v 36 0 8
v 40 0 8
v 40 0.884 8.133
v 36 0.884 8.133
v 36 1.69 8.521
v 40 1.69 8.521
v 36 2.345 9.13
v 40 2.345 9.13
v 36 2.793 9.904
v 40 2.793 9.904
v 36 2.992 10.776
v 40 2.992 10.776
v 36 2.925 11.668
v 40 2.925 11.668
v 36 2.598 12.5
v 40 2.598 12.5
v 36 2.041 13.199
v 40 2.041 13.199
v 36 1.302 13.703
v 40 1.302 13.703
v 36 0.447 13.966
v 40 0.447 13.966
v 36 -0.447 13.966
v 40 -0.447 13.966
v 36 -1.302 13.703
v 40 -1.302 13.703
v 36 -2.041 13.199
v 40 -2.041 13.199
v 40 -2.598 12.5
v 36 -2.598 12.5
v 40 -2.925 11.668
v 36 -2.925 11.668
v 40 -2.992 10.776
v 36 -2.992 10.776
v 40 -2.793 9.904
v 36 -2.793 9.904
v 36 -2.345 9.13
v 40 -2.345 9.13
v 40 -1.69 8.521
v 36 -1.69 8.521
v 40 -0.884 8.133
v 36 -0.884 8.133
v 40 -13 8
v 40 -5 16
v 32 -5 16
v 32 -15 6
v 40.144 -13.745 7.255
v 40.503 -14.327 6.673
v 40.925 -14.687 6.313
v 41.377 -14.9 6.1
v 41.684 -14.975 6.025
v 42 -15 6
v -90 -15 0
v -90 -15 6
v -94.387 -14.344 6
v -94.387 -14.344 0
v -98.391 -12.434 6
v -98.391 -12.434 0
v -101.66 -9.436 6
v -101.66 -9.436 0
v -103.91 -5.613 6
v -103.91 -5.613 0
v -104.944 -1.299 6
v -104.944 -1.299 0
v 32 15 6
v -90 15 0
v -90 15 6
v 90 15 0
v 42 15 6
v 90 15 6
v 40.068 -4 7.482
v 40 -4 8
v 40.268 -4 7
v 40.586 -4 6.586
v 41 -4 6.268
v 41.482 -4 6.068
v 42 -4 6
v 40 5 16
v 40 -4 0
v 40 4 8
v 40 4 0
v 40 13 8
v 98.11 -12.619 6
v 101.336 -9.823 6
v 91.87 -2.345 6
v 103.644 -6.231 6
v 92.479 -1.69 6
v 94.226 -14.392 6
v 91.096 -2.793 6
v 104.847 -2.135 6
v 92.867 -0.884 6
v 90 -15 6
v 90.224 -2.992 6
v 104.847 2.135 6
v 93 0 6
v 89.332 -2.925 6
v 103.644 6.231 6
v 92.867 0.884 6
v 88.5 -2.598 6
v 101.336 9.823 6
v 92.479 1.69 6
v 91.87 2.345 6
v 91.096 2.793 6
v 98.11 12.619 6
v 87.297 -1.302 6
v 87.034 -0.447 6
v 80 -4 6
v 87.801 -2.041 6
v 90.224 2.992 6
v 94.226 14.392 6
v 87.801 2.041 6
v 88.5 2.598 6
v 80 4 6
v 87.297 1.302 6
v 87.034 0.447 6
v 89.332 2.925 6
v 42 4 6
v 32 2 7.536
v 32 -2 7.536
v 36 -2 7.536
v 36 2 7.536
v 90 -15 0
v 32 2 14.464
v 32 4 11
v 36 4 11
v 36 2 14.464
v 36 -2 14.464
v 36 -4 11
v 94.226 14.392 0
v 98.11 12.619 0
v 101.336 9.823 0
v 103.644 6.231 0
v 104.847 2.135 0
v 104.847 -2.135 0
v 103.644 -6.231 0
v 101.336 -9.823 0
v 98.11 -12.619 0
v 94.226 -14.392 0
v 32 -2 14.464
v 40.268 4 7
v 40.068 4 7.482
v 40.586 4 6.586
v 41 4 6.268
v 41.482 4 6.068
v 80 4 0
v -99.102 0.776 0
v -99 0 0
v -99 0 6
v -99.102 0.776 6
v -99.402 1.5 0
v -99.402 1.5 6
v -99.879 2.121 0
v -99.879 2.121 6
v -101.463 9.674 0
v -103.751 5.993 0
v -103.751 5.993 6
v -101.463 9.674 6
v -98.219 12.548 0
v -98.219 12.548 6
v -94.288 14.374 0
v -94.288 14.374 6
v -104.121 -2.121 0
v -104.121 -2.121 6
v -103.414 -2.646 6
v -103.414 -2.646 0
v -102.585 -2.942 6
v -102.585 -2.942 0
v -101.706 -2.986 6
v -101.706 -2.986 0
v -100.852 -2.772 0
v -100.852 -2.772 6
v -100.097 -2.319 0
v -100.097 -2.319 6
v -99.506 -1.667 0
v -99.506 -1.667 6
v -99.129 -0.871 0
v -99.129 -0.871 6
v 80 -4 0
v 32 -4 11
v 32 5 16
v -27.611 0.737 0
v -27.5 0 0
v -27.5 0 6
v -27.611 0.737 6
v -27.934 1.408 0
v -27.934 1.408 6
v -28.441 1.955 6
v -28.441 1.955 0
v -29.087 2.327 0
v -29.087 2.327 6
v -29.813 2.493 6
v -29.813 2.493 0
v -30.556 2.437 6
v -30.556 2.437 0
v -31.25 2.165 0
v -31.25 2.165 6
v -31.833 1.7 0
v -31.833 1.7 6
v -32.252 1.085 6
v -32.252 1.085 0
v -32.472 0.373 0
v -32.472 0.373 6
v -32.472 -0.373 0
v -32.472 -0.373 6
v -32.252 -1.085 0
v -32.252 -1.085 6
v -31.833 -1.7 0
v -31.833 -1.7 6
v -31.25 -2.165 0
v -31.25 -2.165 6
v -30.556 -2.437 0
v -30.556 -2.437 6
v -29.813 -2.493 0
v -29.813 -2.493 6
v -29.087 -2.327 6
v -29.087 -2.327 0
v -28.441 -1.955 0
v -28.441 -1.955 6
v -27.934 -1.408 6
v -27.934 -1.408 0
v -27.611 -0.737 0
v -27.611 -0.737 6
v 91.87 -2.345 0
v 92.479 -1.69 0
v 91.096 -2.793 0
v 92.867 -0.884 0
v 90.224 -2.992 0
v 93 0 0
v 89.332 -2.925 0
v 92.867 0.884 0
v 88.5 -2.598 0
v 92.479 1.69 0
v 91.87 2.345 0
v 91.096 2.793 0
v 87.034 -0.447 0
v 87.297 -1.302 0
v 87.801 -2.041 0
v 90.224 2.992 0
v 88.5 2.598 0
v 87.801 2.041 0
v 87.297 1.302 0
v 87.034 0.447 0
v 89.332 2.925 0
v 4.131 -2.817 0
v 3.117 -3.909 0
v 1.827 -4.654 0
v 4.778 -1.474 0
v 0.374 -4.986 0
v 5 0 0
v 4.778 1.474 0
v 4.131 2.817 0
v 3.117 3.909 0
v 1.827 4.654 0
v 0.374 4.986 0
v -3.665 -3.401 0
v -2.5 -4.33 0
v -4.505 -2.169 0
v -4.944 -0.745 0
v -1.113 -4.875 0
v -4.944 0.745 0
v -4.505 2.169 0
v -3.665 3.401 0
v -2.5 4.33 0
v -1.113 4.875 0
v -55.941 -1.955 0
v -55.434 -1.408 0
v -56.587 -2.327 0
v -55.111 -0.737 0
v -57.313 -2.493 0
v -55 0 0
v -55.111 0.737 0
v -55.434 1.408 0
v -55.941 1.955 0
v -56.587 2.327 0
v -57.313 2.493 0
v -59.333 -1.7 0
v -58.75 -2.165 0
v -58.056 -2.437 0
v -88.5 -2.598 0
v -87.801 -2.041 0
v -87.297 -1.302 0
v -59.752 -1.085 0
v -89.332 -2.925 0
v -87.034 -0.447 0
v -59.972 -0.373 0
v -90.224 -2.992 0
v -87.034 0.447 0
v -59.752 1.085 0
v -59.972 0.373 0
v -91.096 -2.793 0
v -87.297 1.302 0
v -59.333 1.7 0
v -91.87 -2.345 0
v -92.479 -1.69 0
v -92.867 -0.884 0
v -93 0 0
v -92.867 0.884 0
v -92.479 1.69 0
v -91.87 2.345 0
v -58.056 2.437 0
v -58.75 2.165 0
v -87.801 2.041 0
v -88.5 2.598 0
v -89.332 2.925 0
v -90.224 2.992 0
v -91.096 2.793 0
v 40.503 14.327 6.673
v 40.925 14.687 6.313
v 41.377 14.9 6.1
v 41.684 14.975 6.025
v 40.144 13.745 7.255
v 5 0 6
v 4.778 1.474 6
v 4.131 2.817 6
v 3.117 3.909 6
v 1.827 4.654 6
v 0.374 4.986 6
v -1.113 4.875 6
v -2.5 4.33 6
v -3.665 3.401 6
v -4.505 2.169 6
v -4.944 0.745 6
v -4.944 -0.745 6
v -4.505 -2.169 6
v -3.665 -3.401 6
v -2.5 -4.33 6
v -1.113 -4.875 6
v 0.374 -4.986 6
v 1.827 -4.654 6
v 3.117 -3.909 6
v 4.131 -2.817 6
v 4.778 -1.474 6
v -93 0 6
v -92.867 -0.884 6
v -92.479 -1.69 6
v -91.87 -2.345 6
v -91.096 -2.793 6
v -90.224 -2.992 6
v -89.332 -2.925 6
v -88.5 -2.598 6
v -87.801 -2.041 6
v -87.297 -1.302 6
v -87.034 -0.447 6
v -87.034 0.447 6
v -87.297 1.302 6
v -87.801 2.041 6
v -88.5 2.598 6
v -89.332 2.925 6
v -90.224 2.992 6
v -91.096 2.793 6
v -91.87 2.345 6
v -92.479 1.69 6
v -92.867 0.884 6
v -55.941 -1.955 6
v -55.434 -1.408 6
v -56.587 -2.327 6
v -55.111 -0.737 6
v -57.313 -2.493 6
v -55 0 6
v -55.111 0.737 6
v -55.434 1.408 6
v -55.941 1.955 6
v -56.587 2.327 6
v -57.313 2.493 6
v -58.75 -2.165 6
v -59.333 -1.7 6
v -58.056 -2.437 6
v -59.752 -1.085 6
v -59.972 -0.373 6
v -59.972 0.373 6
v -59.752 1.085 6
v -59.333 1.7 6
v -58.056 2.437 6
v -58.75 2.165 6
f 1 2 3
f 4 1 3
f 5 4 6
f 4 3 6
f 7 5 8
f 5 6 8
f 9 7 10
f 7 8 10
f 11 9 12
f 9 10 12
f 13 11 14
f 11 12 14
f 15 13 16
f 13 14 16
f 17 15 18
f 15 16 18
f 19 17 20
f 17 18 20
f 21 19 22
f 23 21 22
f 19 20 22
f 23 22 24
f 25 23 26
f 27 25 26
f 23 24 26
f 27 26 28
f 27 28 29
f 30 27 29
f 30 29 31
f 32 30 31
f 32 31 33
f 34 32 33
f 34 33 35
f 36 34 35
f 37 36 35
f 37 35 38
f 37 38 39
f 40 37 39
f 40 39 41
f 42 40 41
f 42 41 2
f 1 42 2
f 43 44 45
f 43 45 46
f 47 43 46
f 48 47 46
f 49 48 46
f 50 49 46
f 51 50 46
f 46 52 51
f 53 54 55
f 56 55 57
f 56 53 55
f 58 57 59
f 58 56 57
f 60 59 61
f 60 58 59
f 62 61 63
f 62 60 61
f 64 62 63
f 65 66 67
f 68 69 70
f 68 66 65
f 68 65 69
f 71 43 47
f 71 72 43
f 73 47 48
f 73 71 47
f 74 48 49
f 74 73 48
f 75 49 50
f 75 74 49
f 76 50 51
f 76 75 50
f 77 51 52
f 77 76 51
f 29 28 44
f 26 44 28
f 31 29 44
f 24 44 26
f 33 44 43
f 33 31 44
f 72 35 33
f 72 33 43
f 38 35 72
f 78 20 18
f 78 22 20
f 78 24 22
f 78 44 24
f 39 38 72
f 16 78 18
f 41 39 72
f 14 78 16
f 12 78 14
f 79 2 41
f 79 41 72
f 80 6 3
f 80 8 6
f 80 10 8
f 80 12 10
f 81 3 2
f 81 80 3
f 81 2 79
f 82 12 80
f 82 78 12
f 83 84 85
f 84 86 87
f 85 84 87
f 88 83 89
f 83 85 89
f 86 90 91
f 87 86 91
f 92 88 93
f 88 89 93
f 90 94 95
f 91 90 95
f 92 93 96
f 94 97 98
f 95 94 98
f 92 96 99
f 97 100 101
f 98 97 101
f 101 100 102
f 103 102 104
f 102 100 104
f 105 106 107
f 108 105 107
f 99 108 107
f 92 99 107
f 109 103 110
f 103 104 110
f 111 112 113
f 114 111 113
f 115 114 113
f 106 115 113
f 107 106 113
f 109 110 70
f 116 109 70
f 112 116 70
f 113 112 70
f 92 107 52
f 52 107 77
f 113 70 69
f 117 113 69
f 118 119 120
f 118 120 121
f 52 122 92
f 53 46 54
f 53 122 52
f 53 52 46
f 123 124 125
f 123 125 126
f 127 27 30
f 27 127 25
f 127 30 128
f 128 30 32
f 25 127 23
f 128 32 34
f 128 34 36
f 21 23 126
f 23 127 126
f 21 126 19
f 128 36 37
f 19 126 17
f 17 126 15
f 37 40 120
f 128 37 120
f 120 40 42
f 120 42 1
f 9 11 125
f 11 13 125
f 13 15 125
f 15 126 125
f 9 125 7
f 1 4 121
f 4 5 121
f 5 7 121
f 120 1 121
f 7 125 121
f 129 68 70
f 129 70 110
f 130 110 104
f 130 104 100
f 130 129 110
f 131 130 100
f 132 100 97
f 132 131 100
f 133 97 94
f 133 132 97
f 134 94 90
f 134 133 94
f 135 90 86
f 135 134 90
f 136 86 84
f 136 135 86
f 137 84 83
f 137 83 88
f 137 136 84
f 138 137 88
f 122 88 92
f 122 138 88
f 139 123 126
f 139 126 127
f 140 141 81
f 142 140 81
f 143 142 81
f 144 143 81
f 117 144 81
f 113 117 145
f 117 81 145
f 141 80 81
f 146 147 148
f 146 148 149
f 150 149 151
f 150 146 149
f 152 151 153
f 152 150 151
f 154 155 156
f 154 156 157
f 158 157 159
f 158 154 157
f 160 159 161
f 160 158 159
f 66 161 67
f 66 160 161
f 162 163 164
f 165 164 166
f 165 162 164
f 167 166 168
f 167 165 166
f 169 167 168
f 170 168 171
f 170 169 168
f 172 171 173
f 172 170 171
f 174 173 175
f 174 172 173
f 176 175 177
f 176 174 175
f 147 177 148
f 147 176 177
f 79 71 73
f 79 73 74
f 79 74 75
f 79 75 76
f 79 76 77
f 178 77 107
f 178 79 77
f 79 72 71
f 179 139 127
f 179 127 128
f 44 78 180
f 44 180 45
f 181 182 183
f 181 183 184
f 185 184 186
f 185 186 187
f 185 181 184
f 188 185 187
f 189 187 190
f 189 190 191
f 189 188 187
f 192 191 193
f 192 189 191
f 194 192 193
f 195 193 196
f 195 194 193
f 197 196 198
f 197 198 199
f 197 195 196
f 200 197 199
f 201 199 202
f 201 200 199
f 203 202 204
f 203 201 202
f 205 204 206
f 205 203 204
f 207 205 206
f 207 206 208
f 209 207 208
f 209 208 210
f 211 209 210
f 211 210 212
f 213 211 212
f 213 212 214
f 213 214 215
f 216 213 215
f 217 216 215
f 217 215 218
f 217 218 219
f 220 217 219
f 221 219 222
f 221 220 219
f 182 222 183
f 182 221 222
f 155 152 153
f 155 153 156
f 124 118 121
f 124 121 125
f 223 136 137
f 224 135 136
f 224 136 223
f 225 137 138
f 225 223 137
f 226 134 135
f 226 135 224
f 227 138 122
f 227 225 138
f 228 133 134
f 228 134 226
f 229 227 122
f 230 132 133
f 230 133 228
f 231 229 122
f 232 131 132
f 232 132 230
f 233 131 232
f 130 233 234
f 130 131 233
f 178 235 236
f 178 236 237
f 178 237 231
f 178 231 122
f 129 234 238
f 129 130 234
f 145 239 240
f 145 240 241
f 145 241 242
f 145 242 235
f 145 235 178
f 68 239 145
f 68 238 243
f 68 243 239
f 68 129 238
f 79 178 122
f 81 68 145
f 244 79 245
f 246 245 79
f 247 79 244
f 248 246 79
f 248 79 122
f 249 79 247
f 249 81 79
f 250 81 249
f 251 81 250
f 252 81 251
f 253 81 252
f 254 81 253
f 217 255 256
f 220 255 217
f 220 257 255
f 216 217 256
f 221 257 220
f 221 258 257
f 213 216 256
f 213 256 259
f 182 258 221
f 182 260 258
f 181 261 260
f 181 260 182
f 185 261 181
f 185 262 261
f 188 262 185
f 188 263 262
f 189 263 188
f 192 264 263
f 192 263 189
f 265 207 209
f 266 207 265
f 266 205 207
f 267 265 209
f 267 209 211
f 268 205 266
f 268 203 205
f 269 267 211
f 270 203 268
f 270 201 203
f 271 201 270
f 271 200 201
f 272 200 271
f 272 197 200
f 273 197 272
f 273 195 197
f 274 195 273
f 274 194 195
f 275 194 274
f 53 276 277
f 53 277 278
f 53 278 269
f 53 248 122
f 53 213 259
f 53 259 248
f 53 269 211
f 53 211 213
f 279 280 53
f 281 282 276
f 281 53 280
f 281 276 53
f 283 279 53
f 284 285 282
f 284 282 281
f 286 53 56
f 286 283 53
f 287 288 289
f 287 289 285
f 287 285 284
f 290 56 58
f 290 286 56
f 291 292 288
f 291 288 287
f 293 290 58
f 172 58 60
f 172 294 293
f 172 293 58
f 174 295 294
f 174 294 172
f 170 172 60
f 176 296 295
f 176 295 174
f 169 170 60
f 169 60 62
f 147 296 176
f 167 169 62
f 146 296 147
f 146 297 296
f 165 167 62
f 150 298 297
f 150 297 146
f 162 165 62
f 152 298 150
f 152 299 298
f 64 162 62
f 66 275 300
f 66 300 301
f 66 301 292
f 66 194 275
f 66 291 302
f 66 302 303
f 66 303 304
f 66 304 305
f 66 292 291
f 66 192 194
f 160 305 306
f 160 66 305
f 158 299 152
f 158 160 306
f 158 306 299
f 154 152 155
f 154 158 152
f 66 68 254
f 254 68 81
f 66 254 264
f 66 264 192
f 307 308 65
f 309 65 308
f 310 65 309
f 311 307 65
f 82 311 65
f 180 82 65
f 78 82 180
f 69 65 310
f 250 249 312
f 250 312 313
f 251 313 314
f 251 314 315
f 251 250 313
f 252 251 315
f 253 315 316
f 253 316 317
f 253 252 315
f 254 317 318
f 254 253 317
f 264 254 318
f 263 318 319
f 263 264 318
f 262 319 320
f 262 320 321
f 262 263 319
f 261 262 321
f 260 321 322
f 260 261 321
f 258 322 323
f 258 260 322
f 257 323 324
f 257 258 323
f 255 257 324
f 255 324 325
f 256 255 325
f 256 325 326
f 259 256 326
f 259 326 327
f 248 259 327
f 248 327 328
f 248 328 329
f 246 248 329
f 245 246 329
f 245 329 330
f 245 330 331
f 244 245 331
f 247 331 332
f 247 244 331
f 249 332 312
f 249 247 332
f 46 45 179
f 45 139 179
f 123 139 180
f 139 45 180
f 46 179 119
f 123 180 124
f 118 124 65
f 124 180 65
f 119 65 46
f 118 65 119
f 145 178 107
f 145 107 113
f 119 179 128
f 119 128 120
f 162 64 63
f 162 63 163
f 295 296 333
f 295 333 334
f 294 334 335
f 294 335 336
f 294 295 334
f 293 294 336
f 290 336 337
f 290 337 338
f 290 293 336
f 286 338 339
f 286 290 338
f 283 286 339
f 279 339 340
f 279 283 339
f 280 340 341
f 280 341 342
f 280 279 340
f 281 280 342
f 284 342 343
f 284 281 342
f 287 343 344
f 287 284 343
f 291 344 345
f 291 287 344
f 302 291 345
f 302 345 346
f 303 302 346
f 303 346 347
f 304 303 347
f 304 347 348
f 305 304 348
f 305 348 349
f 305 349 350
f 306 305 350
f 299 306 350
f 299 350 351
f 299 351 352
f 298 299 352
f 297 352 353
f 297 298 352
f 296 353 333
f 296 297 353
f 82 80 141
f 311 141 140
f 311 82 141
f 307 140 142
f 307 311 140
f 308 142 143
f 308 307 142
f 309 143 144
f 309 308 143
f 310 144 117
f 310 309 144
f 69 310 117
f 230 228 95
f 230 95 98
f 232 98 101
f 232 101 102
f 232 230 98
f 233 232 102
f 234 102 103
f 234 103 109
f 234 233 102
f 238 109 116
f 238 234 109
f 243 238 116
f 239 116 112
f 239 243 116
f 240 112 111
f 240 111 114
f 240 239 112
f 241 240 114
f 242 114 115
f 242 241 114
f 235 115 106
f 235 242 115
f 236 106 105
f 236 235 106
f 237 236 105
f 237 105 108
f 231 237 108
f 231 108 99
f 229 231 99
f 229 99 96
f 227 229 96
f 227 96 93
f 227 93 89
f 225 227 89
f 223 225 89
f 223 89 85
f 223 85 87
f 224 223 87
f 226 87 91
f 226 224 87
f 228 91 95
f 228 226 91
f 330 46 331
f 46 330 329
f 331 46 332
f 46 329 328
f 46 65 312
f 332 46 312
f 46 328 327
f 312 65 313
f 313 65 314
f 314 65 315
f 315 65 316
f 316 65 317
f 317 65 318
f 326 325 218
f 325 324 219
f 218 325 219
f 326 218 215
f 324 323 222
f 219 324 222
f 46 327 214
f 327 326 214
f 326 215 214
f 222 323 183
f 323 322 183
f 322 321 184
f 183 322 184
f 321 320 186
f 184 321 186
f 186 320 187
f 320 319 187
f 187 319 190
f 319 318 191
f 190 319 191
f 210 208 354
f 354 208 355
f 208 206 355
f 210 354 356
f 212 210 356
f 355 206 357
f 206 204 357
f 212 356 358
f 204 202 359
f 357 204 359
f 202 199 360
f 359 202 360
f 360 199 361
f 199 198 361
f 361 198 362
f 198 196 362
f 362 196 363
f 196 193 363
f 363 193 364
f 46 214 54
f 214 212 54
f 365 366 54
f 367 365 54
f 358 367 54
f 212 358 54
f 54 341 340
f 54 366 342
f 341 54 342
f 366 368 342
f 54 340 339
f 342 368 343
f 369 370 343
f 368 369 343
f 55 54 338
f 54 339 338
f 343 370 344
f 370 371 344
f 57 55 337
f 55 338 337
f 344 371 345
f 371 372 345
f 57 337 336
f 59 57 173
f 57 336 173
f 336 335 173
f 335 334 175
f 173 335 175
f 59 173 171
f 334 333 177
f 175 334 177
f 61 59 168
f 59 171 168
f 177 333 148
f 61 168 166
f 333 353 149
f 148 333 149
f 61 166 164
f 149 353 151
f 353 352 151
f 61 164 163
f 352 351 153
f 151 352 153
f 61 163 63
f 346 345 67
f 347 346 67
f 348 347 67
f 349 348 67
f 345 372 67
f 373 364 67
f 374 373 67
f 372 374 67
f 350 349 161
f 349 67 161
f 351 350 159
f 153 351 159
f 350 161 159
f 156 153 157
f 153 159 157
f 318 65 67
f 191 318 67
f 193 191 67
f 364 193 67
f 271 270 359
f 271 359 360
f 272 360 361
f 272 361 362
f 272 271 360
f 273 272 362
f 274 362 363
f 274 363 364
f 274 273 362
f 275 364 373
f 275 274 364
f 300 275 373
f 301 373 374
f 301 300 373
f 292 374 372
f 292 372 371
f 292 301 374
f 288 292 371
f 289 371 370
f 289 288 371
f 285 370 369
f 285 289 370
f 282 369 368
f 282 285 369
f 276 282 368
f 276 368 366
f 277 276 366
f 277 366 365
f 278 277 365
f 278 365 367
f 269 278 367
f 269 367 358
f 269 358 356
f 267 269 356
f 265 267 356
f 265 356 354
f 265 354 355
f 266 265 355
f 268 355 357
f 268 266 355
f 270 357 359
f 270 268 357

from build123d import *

# Parameters (mm, degrees)
ESQUISSE1_R             = 3
ESQUISSE1_R_2           = 5
ESQUISSE1_R_3           = 2.5
ESQUISSE1_W             = 40
ESQUISSE1_H             = 8
BOSS_EXTRU_1_DEPTH      = 6
ESQUISSE2_R             = 3
BOSS_EXTRU_2_DEPTH      = 8
CONG_2_R                = 2
ENL_V_MAT_EXTRU_1_DEPTH = 4
ENL_V_START             = -10
ENL_V_MAT_EXTRU_4_DEPTH = 10


with BuildPart() as part:
    # Esquisse1 → Boss.-Extru.1 (new body)
    with BuildSketch(Plane.XY):
        with BuildLine():
            Line((90, -15), (-90, -15))
            ThreePointArc((-90, -15), (-105, 0), (-90, 15))
            Line((-90, 15), (90, 15))
            ThreePointArc((90, 15), (105, 0), (90, -15))
        make_face()
        with Locations((90, 0)):
            Circle(ESQUISSE1_R, mode=Mode.SUBTRACT)
        with Locations(Location((-90, 0, 0), (0, 0, 180))):
            Circle(ESQUISSE1_R, mode=Mode.SUBTRACT)
        Circle(ESQUISSE1_R_2, mode=Mode.SUBTRACT)
        with Locations((-57.5, 0)):
            Circle(ESQUISSE1_R_3, mode=Mode.SUBTRACT)
        with Locations((-30, 0)):
            Circle(ESQUISSE1_R_3, mode=Mode.SUBTRACT)
        with Locations((60, 0)):
            Rectangle(ESQUISSE1_W, ESQUISSE1_H, mode=Mode.SUBTRACT)
    extrude(amount=BOSS_EXTRU_1_DEPTH)

    # Esquisse2 → Boss.-Extru.2 (add)
    with BuildSketch(Plane(origin=(40, 0, 0), x_dir=(0, 0, -1), z_dir=(1, 0, 0))):
        Polygon((-16, 5), (-16, -5), (-6, -15), (-6, -5), (-6, 5), (-6, 15), align=None)
        with Locations((-11, 0)):
            Circle(ESQUISSE2_R, mode=Mode.SUBTRACT)
    extrude(amount=-BOSS_EXTRU_2_DEPTH)

    # Congé2
    cong_2_edges = [part.edges().sort_by_distance(p)[0] for p in [
        (40, 9.5, 6),
        (40, -9.5, 6),
    ]]
    fillet(cong_2_edges, radius=CONG_2_R - 0.0001)  # a hair under: the kernel refuses the full size

    # Esquisse3 → Enlèv. mat.-Extru.1 (cut)
    with BuildSketch(Plane.ZY.offset(-32)):
        Polygon((11, 4), (14.464101615, 2), (14.464101615, -2), (11, -4), (7.535898385, -2), (7.535898385, 2), align=None)
    extrude(amount=-ENL_V_MAT_EXTRU_1_DEPTH, mode=Mode.SUBTRACT)

    # Esquisse4 → Enlèv. mat.-Extru.4 (cut)
    with BuildSketch(Plane.XY.offset(6).offset(ENL_V_START)):
        with BuildLine():
            ThreePointArc((-105, 0), (-104.771638598, -1.148050297), (-104.121320344, -2.121320344))
            Line((-104.121320344, -2.121320344), (-99.878679656, 2.121320344))
            ThreePointArc((-99.878679656, 2.121320344), (-103.148050297, 2.771638598), (-105, 0))
        make_face()
        with BuildLine():
            Line((-99.878679656, 2.121320344), (-104.121320344, -2.121320344))
            ThreePointArc((-104.121320344, -2.121320344), (-100.851949703, -2.771638598), (-99, 0))
            ThreePointArc((-99, 0), (-99.228361402, 1.148050297), (-99.878679656, 2.121320344))
        make_face()
        with BuildLine():
            ThreePointArc((-105, 0), (-103.148050297, 2.771638598), (-99.878679656, 2.121320344))
            Line((-99.878679656, 2.121320344), (-103.750652313, 5.993293))
            ThreePointArc((-103.750652313, 5.993293), (-104.68434174, 3.061063158), (-105, 0))
        make_face()
        with BuildLine():
            Line((-104.94364809, -1.298992597), (-104.121320344, -2.121320344))
            ThreePointArc((-104.121320344, -2.121320344), (-104.771638598, -1.148050297), (-105, 0))
            ThreePointArc((-105, 0), (-104.985905401, -0.650107165), (-104.94364809, -1.298992597))
        make_face()
        with BuildLine():
            ThreePointArc((-105, 0), (-104.771638598, -1.148050297), (-104.121320344, -2.121320344))
            Line((-104.121320344, -2.121320344), (-99.878679656, 2.121320344))
            ThreePointArc((-99.878679656, 2.121320344), (-103.148050297, 2.771638598), (-105, 0))
        make_face()
        with BuildLine():
            Line((-99.878679656, 2.121320344), (-104.121320344, -2.121320344))
            ThreePointArc((-104.121320344, -2.121320344), (-100.851949703, -2.771638598), (-99, 0))
            ThreePointArc((-99, 0), (-99.228361402, 1.148050297), (-99.878679656, 2.121320344))
        make_face()
    extrude(amount=ENL_V_MAT_EXTRU_4_DEPTH, mode=Mode.SUBTRACT)


solid = part.part
